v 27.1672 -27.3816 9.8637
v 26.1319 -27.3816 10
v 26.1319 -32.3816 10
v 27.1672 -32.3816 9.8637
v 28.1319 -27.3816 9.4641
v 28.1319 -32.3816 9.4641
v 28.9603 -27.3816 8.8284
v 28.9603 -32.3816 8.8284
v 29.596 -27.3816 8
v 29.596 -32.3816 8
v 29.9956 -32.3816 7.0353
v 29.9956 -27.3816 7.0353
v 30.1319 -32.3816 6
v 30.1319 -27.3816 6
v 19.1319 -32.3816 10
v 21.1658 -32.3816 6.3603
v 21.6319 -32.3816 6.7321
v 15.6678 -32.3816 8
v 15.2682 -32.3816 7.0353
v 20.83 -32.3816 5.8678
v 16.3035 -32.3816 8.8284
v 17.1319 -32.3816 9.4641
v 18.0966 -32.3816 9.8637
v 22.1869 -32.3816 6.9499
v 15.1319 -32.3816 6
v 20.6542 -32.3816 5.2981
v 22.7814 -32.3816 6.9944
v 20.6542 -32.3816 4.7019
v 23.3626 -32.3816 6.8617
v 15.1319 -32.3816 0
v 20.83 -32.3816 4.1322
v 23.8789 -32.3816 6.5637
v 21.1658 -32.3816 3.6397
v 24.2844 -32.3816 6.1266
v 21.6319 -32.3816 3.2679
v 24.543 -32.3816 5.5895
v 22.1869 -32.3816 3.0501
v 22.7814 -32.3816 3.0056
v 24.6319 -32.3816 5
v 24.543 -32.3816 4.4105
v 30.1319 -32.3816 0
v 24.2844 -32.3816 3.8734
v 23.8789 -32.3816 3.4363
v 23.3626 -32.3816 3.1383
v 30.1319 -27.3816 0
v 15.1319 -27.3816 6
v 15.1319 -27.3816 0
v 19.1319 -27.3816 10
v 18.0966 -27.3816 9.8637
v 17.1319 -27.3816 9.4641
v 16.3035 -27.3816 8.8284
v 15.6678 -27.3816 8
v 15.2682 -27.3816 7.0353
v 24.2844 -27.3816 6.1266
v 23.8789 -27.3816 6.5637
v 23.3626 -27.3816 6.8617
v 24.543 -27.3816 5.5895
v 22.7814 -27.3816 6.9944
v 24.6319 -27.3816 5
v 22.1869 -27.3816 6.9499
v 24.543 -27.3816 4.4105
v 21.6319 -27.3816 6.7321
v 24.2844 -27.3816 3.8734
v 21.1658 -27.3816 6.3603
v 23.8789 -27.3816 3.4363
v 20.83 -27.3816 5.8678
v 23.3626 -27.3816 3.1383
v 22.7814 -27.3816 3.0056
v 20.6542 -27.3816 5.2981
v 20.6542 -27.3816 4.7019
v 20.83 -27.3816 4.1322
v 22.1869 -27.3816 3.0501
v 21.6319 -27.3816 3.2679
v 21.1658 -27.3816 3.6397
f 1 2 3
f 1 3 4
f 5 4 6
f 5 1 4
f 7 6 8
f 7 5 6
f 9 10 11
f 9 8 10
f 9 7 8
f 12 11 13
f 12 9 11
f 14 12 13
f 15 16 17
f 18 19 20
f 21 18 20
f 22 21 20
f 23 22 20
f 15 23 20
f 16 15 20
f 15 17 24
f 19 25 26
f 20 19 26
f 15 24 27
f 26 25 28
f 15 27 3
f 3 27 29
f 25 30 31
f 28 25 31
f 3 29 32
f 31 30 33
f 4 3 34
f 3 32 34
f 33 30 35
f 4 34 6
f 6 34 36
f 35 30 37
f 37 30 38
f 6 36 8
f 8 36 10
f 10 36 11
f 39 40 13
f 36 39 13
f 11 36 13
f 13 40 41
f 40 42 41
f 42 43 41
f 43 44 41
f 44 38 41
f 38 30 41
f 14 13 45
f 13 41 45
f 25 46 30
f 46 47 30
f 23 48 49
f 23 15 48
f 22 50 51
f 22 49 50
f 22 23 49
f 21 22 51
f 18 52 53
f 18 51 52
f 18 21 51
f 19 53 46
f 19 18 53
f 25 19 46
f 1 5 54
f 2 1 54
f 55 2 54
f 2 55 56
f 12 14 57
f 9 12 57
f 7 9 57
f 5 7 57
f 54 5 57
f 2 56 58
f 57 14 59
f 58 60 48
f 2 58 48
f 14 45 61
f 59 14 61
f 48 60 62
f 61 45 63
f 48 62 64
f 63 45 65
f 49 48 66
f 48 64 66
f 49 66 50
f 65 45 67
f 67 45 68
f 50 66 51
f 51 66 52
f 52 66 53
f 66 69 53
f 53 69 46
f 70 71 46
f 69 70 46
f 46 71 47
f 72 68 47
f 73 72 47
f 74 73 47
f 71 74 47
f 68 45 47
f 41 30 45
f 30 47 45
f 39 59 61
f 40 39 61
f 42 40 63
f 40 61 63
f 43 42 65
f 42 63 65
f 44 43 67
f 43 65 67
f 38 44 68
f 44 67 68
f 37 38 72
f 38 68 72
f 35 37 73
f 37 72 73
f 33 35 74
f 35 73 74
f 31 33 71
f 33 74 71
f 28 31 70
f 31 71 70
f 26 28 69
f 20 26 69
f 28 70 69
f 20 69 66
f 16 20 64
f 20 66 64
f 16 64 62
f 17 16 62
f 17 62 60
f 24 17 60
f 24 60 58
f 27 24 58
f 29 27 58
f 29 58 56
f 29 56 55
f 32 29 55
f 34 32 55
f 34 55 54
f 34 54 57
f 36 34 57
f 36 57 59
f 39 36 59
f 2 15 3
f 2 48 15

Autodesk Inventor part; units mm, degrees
ref_plane "YZ Plane" through (0, 0, 0) normal (1, 0, 0) x (0, 1, 0)
ref_plane "XZ Plane" through (0, 0, 0) normal (0, 1, 0) x (-1, 0, 0)
ref_plane "XY Plane" through (0, 0, 0) normal (0, 0, 1) x (1, 0, 0)
sketch "Sketch1" plane through (0, 0, 0) normal (0, 0, 1) x (1, 0, 0)
  line L0 (30.1319, -27.3816) -> (15.1319, -27.3816)
  line L1 (15.1319, -27.3816) -> (15.1319, -32.3816)
  line L2 (15.1319, -32.3816) -> (30.1319, -32.3816)
  line L3 (30.1319, -32.3816) -> (30.1319, -27.3816)
  point P0 (0, 0)
  dimension "d0" = 15
  dimension "d1" = 5
extrude "Extrusion1" add sketch "Sketch1" along normal blind 10
fillet "Fillet1" radius 4 2 edges at (15.1319, -29.8816, 10) (30.1319, -29.8816, 10)
sketch "Sketch2" plane through (15.1319, -27.3816, 0) normal (0, 1, 0) x (1, 0, 0)
  circle A0 centre (7.5, -5) radius 2
  line L0 (11, -10) -> (4, -10) projected
  line L1 (0, 0) -> (0, -6) projected
  point P0 (-15.1319, 0)
  dimension "d5" = 4
  dimension "d6" = 5
  dimension "d7" = 7.5
extrude "Extrusion2" cut sketch "Sketch2" against normal blind 7.5
thread "Thread1" size "M4x0.7" class "6H" standard "ANSI Metric M Profile" full length
properties part number "víko_držák" material "Aluminum 6061"
